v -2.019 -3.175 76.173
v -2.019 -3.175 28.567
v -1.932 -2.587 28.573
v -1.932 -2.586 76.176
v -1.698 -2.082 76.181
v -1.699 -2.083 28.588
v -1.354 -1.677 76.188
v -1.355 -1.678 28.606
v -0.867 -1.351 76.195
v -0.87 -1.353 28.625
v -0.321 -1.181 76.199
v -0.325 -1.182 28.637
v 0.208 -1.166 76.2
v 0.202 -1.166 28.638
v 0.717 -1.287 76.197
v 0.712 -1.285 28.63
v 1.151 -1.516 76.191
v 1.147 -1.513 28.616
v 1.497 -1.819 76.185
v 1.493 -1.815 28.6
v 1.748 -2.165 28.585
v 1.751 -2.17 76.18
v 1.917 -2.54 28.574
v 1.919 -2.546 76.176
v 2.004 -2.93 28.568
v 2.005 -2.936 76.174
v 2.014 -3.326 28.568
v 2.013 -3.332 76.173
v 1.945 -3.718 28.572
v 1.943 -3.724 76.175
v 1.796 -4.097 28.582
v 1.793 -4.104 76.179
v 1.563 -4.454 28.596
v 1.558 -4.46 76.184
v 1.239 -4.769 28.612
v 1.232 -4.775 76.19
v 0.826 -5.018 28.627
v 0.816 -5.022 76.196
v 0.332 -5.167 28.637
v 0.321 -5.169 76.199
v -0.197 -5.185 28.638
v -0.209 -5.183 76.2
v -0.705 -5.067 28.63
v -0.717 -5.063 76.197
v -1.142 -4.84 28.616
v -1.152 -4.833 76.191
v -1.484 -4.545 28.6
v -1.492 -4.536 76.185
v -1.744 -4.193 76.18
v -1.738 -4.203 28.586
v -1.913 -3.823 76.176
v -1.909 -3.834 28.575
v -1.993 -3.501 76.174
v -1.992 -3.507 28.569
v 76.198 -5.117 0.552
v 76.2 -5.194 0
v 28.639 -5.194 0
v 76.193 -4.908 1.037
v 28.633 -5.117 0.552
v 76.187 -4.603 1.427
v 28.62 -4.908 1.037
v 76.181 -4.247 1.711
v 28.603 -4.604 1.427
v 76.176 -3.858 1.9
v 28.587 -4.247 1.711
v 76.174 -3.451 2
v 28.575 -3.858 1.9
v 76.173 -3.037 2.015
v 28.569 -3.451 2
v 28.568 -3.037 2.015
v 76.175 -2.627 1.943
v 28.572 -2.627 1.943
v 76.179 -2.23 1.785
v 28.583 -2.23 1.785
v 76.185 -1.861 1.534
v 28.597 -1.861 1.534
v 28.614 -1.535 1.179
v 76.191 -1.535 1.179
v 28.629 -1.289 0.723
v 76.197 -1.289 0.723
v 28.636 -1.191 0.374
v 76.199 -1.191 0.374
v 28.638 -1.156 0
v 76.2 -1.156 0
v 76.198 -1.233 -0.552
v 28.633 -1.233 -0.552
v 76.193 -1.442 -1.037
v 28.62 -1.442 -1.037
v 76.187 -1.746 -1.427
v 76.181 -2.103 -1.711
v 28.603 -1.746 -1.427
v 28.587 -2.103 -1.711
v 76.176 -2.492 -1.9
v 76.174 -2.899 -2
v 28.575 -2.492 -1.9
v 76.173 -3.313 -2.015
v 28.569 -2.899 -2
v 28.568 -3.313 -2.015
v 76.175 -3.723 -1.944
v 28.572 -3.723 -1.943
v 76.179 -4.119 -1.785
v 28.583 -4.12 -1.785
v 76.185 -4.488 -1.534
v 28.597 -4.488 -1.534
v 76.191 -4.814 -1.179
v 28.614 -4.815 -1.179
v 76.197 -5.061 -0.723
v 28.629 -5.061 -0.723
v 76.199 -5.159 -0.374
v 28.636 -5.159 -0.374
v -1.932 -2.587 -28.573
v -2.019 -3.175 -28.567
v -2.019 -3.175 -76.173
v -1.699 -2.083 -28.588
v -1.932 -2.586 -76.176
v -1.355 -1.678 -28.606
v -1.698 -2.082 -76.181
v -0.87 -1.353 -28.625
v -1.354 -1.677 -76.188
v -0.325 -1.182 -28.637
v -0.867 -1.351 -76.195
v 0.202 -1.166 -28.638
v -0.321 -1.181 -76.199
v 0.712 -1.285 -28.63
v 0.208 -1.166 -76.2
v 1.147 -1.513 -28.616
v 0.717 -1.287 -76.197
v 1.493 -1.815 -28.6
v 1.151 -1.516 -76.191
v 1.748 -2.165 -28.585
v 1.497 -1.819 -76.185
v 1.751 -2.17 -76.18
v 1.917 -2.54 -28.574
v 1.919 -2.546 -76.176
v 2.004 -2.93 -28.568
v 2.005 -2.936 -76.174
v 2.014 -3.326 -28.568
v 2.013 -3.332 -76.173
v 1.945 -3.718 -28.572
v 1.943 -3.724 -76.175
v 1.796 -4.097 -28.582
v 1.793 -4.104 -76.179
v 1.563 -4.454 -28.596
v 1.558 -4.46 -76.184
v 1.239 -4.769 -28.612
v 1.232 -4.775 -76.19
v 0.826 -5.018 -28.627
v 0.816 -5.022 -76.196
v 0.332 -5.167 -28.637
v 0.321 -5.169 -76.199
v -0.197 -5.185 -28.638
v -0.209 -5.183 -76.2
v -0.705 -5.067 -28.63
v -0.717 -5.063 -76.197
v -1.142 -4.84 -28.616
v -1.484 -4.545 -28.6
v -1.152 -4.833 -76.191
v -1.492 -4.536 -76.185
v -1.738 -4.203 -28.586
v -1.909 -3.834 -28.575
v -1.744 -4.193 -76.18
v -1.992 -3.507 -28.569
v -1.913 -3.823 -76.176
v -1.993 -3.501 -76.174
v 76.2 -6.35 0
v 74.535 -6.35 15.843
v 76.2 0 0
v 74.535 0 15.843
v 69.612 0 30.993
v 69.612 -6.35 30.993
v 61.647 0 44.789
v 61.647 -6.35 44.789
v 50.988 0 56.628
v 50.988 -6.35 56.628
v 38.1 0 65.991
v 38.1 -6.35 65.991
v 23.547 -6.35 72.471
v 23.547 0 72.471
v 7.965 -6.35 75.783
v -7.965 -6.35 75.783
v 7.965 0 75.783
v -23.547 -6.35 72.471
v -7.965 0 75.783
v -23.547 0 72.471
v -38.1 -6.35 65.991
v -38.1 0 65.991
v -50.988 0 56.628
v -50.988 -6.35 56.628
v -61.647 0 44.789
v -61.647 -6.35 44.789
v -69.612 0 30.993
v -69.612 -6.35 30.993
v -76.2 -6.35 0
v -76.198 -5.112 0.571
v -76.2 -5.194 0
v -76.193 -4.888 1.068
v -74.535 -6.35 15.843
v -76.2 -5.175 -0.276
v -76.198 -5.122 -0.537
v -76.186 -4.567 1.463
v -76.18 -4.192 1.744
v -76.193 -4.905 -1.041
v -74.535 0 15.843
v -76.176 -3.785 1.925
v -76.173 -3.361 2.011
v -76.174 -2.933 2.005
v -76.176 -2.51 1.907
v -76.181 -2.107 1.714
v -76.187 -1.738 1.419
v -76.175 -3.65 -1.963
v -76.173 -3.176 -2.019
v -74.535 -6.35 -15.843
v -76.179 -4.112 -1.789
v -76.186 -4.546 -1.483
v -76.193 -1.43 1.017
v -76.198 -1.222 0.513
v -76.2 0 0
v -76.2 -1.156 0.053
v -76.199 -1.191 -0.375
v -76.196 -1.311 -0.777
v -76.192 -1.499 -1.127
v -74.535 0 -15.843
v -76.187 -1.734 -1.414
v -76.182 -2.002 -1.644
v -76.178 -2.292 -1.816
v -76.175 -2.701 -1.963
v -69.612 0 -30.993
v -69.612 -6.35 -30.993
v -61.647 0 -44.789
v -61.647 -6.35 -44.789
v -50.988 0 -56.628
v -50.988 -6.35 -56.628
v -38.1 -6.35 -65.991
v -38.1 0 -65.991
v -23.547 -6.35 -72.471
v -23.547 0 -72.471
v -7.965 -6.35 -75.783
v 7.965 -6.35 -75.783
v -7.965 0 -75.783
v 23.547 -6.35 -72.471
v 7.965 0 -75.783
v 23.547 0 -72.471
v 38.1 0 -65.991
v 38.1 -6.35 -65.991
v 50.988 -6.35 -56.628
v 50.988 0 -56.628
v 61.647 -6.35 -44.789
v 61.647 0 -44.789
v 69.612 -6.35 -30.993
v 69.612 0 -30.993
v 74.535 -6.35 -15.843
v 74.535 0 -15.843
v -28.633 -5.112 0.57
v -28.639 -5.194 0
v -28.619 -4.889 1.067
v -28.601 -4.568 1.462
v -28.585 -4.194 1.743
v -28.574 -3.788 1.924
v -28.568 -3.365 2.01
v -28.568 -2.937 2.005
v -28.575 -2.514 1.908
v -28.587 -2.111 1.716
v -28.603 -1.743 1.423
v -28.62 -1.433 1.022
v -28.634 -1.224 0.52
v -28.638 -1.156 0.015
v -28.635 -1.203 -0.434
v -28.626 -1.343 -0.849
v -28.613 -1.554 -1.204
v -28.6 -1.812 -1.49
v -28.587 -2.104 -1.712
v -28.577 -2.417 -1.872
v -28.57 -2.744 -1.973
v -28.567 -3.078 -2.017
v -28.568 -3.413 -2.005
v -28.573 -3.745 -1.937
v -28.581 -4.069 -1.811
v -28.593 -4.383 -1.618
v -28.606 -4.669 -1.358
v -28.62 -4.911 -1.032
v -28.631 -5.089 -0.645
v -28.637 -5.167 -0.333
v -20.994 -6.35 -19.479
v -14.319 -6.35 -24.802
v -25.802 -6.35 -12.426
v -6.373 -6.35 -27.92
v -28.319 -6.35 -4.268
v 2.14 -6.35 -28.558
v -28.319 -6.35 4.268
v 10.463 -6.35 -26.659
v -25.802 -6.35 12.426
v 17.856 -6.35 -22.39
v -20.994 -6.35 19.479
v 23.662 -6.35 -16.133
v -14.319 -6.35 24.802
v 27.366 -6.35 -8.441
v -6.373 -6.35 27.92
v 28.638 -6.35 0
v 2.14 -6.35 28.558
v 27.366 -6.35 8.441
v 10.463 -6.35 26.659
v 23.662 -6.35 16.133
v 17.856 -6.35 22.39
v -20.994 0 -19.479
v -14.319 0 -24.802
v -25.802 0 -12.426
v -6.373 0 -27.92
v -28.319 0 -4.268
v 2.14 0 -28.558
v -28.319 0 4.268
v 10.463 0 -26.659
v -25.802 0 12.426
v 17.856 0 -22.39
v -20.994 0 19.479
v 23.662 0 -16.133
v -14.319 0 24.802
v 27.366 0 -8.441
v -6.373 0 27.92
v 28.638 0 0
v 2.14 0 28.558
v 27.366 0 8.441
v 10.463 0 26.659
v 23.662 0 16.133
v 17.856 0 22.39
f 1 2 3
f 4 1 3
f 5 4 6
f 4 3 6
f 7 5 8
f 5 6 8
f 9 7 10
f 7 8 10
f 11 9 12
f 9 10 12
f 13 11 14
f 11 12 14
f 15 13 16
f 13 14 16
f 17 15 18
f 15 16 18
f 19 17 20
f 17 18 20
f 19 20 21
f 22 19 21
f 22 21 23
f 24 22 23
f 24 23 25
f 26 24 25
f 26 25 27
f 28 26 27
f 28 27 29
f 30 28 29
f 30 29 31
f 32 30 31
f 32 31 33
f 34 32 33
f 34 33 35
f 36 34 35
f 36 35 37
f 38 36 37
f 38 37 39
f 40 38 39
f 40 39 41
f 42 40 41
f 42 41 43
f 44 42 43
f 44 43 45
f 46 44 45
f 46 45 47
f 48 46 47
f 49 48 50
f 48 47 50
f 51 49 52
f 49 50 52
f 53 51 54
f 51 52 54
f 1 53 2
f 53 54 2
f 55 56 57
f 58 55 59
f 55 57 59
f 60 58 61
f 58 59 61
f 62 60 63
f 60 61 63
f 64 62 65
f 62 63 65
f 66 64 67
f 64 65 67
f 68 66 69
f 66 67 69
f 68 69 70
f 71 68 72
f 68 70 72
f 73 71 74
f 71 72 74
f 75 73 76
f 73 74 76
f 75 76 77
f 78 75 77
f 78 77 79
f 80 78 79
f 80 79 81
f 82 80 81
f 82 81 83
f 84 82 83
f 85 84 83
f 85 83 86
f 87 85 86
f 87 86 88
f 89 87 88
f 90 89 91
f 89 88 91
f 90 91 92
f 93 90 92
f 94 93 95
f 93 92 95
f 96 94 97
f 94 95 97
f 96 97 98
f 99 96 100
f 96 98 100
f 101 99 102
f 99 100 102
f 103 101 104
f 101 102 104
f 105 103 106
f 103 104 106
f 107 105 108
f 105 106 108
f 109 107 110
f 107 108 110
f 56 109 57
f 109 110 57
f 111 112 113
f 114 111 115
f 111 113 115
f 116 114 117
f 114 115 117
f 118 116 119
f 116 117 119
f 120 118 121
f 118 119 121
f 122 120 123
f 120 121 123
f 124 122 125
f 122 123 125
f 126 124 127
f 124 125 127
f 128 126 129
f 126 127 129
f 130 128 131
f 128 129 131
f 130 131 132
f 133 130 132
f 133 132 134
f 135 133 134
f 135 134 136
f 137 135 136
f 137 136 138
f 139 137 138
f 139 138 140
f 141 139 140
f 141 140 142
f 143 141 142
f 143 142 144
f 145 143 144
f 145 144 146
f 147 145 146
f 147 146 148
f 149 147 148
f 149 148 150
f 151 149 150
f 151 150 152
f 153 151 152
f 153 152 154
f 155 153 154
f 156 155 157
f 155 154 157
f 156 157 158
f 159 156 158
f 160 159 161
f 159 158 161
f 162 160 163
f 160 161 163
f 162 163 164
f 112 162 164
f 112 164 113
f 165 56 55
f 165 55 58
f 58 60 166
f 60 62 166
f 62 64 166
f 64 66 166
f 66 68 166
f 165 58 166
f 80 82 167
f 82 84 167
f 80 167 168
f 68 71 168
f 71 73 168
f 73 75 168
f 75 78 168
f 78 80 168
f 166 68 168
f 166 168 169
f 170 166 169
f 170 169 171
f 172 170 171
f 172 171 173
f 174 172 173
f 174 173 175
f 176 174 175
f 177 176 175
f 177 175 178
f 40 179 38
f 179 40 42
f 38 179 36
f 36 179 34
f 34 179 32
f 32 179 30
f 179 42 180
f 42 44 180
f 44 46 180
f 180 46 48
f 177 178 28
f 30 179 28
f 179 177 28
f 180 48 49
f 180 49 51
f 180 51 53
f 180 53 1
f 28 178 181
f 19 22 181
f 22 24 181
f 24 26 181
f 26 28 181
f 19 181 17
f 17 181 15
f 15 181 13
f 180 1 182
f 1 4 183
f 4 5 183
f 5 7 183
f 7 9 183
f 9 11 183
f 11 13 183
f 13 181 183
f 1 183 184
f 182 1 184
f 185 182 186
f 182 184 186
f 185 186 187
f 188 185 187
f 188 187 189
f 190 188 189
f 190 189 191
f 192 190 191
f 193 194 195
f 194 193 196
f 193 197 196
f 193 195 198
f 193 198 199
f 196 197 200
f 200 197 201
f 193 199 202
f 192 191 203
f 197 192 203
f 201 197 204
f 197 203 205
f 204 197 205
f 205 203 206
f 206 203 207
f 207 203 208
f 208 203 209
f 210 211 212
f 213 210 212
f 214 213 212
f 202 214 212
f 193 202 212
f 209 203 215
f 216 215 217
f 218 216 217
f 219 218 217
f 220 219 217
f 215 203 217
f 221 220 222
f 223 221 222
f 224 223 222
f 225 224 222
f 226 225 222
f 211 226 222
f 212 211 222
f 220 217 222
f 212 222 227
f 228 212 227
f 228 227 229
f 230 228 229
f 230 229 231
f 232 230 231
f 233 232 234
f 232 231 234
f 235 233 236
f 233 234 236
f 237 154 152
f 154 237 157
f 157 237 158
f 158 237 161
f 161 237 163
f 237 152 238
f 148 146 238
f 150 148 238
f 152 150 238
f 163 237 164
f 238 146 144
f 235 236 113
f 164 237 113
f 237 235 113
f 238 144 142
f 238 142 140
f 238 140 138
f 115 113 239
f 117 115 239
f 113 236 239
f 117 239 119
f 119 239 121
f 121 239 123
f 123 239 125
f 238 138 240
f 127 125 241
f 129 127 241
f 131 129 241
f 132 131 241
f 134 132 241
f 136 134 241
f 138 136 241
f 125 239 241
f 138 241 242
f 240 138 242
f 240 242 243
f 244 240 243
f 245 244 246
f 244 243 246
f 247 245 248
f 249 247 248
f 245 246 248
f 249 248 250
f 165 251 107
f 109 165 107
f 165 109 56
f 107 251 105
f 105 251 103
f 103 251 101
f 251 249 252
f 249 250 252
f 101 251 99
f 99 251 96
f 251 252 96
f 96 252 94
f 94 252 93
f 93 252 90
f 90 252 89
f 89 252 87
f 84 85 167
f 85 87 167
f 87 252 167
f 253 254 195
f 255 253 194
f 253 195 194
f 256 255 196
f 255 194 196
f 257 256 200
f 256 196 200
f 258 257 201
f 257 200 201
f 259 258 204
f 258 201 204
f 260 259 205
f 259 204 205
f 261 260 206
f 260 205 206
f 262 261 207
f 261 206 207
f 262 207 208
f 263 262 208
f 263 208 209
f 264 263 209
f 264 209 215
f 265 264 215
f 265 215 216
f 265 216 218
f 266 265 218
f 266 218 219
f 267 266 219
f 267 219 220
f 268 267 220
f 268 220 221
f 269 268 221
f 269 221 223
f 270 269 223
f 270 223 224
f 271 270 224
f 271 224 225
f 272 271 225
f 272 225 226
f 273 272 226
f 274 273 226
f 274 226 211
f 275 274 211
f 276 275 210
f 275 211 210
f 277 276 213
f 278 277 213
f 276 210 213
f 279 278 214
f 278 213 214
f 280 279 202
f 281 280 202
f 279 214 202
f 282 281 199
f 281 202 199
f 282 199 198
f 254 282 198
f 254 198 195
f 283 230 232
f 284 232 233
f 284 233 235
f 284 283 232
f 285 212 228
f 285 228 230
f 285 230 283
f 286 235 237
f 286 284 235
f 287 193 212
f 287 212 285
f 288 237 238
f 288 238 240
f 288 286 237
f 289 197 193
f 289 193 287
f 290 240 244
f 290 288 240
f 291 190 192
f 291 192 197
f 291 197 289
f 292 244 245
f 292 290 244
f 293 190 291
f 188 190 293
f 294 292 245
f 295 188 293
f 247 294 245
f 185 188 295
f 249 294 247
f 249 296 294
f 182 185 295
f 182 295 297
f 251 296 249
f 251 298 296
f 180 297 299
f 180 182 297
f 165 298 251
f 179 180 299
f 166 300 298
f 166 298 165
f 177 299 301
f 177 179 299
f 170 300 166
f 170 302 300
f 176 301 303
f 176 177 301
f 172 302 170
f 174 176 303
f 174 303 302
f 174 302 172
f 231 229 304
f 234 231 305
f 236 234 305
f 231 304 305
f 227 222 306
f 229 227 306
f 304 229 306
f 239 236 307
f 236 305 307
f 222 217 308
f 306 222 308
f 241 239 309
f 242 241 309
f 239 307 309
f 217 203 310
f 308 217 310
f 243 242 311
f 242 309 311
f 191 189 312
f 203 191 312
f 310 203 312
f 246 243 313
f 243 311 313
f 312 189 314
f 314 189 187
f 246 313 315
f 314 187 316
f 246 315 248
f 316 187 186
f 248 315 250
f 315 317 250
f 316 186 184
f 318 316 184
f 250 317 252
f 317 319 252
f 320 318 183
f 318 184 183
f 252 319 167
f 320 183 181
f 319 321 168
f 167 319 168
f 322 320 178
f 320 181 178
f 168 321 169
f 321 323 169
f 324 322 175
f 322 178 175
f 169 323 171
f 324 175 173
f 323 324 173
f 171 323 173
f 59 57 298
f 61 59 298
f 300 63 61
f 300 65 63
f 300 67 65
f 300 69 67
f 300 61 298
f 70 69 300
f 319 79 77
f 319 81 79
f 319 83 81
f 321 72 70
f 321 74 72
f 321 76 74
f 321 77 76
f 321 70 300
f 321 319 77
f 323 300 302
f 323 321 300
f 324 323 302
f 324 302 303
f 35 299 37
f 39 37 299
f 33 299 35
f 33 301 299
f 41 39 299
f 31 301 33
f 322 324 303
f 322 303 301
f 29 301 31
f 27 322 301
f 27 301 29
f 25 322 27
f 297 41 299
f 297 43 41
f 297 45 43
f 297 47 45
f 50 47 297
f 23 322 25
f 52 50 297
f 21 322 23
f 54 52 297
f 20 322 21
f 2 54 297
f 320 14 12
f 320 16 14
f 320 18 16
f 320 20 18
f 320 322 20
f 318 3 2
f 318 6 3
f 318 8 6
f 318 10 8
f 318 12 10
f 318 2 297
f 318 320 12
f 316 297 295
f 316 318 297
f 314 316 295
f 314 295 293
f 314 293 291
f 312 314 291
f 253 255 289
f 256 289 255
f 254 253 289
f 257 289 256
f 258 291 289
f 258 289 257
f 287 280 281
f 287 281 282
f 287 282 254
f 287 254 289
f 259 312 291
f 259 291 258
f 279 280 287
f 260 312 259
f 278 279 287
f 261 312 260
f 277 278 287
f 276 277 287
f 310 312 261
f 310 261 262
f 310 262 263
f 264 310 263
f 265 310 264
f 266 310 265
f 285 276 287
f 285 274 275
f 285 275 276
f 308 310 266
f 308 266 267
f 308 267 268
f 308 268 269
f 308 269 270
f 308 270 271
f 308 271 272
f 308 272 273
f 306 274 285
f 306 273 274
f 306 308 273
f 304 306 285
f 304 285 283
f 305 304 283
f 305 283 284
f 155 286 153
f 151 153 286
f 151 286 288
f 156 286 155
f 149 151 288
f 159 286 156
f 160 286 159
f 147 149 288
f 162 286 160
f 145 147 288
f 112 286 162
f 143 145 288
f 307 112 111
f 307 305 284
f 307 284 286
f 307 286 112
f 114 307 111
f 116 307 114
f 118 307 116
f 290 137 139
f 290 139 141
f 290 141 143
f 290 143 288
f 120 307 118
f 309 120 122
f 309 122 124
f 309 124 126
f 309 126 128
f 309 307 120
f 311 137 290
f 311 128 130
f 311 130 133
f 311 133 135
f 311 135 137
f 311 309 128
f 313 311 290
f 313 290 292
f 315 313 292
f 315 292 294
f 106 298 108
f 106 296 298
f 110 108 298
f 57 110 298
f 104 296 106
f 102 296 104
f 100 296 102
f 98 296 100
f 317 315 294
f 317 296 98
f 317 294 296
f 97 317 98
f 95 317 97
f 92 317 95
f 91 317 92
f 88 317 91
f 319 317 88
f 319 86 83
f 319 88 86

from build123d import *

# Parameters (mm, degrees)
F0_R     = 76.2
F0_R_2   = 28.6385
F1_DEPTH = 6.35
F4_D     = 4.0386
F7_D     = 4.0386


# Not quite as in the source:
# - a feature names something its author has since deleted; it is built from what else it names


with BuildPart() as f1:
    # F0 (on Front) → F1 (new body)
    with BuildSketch(Plane.XZ):
        Circle(F0_R)
        Circle(F0_R_2, mode=Mode.SUBTRACT)
    extrude(amount=F1_DEPTH)

    # F4 (through all)
    with Locations(Plane.XY.offset(76.2)):
        with Locations((0, -3.175)):
            Hole(F4_D / 2)

    # F7 (through all)
    with Locations(Plane.YZ.offset(76.2)):
        with Locations((-3.175, 0)):
            Hole(F7_D / 2)


solid = f1.part
